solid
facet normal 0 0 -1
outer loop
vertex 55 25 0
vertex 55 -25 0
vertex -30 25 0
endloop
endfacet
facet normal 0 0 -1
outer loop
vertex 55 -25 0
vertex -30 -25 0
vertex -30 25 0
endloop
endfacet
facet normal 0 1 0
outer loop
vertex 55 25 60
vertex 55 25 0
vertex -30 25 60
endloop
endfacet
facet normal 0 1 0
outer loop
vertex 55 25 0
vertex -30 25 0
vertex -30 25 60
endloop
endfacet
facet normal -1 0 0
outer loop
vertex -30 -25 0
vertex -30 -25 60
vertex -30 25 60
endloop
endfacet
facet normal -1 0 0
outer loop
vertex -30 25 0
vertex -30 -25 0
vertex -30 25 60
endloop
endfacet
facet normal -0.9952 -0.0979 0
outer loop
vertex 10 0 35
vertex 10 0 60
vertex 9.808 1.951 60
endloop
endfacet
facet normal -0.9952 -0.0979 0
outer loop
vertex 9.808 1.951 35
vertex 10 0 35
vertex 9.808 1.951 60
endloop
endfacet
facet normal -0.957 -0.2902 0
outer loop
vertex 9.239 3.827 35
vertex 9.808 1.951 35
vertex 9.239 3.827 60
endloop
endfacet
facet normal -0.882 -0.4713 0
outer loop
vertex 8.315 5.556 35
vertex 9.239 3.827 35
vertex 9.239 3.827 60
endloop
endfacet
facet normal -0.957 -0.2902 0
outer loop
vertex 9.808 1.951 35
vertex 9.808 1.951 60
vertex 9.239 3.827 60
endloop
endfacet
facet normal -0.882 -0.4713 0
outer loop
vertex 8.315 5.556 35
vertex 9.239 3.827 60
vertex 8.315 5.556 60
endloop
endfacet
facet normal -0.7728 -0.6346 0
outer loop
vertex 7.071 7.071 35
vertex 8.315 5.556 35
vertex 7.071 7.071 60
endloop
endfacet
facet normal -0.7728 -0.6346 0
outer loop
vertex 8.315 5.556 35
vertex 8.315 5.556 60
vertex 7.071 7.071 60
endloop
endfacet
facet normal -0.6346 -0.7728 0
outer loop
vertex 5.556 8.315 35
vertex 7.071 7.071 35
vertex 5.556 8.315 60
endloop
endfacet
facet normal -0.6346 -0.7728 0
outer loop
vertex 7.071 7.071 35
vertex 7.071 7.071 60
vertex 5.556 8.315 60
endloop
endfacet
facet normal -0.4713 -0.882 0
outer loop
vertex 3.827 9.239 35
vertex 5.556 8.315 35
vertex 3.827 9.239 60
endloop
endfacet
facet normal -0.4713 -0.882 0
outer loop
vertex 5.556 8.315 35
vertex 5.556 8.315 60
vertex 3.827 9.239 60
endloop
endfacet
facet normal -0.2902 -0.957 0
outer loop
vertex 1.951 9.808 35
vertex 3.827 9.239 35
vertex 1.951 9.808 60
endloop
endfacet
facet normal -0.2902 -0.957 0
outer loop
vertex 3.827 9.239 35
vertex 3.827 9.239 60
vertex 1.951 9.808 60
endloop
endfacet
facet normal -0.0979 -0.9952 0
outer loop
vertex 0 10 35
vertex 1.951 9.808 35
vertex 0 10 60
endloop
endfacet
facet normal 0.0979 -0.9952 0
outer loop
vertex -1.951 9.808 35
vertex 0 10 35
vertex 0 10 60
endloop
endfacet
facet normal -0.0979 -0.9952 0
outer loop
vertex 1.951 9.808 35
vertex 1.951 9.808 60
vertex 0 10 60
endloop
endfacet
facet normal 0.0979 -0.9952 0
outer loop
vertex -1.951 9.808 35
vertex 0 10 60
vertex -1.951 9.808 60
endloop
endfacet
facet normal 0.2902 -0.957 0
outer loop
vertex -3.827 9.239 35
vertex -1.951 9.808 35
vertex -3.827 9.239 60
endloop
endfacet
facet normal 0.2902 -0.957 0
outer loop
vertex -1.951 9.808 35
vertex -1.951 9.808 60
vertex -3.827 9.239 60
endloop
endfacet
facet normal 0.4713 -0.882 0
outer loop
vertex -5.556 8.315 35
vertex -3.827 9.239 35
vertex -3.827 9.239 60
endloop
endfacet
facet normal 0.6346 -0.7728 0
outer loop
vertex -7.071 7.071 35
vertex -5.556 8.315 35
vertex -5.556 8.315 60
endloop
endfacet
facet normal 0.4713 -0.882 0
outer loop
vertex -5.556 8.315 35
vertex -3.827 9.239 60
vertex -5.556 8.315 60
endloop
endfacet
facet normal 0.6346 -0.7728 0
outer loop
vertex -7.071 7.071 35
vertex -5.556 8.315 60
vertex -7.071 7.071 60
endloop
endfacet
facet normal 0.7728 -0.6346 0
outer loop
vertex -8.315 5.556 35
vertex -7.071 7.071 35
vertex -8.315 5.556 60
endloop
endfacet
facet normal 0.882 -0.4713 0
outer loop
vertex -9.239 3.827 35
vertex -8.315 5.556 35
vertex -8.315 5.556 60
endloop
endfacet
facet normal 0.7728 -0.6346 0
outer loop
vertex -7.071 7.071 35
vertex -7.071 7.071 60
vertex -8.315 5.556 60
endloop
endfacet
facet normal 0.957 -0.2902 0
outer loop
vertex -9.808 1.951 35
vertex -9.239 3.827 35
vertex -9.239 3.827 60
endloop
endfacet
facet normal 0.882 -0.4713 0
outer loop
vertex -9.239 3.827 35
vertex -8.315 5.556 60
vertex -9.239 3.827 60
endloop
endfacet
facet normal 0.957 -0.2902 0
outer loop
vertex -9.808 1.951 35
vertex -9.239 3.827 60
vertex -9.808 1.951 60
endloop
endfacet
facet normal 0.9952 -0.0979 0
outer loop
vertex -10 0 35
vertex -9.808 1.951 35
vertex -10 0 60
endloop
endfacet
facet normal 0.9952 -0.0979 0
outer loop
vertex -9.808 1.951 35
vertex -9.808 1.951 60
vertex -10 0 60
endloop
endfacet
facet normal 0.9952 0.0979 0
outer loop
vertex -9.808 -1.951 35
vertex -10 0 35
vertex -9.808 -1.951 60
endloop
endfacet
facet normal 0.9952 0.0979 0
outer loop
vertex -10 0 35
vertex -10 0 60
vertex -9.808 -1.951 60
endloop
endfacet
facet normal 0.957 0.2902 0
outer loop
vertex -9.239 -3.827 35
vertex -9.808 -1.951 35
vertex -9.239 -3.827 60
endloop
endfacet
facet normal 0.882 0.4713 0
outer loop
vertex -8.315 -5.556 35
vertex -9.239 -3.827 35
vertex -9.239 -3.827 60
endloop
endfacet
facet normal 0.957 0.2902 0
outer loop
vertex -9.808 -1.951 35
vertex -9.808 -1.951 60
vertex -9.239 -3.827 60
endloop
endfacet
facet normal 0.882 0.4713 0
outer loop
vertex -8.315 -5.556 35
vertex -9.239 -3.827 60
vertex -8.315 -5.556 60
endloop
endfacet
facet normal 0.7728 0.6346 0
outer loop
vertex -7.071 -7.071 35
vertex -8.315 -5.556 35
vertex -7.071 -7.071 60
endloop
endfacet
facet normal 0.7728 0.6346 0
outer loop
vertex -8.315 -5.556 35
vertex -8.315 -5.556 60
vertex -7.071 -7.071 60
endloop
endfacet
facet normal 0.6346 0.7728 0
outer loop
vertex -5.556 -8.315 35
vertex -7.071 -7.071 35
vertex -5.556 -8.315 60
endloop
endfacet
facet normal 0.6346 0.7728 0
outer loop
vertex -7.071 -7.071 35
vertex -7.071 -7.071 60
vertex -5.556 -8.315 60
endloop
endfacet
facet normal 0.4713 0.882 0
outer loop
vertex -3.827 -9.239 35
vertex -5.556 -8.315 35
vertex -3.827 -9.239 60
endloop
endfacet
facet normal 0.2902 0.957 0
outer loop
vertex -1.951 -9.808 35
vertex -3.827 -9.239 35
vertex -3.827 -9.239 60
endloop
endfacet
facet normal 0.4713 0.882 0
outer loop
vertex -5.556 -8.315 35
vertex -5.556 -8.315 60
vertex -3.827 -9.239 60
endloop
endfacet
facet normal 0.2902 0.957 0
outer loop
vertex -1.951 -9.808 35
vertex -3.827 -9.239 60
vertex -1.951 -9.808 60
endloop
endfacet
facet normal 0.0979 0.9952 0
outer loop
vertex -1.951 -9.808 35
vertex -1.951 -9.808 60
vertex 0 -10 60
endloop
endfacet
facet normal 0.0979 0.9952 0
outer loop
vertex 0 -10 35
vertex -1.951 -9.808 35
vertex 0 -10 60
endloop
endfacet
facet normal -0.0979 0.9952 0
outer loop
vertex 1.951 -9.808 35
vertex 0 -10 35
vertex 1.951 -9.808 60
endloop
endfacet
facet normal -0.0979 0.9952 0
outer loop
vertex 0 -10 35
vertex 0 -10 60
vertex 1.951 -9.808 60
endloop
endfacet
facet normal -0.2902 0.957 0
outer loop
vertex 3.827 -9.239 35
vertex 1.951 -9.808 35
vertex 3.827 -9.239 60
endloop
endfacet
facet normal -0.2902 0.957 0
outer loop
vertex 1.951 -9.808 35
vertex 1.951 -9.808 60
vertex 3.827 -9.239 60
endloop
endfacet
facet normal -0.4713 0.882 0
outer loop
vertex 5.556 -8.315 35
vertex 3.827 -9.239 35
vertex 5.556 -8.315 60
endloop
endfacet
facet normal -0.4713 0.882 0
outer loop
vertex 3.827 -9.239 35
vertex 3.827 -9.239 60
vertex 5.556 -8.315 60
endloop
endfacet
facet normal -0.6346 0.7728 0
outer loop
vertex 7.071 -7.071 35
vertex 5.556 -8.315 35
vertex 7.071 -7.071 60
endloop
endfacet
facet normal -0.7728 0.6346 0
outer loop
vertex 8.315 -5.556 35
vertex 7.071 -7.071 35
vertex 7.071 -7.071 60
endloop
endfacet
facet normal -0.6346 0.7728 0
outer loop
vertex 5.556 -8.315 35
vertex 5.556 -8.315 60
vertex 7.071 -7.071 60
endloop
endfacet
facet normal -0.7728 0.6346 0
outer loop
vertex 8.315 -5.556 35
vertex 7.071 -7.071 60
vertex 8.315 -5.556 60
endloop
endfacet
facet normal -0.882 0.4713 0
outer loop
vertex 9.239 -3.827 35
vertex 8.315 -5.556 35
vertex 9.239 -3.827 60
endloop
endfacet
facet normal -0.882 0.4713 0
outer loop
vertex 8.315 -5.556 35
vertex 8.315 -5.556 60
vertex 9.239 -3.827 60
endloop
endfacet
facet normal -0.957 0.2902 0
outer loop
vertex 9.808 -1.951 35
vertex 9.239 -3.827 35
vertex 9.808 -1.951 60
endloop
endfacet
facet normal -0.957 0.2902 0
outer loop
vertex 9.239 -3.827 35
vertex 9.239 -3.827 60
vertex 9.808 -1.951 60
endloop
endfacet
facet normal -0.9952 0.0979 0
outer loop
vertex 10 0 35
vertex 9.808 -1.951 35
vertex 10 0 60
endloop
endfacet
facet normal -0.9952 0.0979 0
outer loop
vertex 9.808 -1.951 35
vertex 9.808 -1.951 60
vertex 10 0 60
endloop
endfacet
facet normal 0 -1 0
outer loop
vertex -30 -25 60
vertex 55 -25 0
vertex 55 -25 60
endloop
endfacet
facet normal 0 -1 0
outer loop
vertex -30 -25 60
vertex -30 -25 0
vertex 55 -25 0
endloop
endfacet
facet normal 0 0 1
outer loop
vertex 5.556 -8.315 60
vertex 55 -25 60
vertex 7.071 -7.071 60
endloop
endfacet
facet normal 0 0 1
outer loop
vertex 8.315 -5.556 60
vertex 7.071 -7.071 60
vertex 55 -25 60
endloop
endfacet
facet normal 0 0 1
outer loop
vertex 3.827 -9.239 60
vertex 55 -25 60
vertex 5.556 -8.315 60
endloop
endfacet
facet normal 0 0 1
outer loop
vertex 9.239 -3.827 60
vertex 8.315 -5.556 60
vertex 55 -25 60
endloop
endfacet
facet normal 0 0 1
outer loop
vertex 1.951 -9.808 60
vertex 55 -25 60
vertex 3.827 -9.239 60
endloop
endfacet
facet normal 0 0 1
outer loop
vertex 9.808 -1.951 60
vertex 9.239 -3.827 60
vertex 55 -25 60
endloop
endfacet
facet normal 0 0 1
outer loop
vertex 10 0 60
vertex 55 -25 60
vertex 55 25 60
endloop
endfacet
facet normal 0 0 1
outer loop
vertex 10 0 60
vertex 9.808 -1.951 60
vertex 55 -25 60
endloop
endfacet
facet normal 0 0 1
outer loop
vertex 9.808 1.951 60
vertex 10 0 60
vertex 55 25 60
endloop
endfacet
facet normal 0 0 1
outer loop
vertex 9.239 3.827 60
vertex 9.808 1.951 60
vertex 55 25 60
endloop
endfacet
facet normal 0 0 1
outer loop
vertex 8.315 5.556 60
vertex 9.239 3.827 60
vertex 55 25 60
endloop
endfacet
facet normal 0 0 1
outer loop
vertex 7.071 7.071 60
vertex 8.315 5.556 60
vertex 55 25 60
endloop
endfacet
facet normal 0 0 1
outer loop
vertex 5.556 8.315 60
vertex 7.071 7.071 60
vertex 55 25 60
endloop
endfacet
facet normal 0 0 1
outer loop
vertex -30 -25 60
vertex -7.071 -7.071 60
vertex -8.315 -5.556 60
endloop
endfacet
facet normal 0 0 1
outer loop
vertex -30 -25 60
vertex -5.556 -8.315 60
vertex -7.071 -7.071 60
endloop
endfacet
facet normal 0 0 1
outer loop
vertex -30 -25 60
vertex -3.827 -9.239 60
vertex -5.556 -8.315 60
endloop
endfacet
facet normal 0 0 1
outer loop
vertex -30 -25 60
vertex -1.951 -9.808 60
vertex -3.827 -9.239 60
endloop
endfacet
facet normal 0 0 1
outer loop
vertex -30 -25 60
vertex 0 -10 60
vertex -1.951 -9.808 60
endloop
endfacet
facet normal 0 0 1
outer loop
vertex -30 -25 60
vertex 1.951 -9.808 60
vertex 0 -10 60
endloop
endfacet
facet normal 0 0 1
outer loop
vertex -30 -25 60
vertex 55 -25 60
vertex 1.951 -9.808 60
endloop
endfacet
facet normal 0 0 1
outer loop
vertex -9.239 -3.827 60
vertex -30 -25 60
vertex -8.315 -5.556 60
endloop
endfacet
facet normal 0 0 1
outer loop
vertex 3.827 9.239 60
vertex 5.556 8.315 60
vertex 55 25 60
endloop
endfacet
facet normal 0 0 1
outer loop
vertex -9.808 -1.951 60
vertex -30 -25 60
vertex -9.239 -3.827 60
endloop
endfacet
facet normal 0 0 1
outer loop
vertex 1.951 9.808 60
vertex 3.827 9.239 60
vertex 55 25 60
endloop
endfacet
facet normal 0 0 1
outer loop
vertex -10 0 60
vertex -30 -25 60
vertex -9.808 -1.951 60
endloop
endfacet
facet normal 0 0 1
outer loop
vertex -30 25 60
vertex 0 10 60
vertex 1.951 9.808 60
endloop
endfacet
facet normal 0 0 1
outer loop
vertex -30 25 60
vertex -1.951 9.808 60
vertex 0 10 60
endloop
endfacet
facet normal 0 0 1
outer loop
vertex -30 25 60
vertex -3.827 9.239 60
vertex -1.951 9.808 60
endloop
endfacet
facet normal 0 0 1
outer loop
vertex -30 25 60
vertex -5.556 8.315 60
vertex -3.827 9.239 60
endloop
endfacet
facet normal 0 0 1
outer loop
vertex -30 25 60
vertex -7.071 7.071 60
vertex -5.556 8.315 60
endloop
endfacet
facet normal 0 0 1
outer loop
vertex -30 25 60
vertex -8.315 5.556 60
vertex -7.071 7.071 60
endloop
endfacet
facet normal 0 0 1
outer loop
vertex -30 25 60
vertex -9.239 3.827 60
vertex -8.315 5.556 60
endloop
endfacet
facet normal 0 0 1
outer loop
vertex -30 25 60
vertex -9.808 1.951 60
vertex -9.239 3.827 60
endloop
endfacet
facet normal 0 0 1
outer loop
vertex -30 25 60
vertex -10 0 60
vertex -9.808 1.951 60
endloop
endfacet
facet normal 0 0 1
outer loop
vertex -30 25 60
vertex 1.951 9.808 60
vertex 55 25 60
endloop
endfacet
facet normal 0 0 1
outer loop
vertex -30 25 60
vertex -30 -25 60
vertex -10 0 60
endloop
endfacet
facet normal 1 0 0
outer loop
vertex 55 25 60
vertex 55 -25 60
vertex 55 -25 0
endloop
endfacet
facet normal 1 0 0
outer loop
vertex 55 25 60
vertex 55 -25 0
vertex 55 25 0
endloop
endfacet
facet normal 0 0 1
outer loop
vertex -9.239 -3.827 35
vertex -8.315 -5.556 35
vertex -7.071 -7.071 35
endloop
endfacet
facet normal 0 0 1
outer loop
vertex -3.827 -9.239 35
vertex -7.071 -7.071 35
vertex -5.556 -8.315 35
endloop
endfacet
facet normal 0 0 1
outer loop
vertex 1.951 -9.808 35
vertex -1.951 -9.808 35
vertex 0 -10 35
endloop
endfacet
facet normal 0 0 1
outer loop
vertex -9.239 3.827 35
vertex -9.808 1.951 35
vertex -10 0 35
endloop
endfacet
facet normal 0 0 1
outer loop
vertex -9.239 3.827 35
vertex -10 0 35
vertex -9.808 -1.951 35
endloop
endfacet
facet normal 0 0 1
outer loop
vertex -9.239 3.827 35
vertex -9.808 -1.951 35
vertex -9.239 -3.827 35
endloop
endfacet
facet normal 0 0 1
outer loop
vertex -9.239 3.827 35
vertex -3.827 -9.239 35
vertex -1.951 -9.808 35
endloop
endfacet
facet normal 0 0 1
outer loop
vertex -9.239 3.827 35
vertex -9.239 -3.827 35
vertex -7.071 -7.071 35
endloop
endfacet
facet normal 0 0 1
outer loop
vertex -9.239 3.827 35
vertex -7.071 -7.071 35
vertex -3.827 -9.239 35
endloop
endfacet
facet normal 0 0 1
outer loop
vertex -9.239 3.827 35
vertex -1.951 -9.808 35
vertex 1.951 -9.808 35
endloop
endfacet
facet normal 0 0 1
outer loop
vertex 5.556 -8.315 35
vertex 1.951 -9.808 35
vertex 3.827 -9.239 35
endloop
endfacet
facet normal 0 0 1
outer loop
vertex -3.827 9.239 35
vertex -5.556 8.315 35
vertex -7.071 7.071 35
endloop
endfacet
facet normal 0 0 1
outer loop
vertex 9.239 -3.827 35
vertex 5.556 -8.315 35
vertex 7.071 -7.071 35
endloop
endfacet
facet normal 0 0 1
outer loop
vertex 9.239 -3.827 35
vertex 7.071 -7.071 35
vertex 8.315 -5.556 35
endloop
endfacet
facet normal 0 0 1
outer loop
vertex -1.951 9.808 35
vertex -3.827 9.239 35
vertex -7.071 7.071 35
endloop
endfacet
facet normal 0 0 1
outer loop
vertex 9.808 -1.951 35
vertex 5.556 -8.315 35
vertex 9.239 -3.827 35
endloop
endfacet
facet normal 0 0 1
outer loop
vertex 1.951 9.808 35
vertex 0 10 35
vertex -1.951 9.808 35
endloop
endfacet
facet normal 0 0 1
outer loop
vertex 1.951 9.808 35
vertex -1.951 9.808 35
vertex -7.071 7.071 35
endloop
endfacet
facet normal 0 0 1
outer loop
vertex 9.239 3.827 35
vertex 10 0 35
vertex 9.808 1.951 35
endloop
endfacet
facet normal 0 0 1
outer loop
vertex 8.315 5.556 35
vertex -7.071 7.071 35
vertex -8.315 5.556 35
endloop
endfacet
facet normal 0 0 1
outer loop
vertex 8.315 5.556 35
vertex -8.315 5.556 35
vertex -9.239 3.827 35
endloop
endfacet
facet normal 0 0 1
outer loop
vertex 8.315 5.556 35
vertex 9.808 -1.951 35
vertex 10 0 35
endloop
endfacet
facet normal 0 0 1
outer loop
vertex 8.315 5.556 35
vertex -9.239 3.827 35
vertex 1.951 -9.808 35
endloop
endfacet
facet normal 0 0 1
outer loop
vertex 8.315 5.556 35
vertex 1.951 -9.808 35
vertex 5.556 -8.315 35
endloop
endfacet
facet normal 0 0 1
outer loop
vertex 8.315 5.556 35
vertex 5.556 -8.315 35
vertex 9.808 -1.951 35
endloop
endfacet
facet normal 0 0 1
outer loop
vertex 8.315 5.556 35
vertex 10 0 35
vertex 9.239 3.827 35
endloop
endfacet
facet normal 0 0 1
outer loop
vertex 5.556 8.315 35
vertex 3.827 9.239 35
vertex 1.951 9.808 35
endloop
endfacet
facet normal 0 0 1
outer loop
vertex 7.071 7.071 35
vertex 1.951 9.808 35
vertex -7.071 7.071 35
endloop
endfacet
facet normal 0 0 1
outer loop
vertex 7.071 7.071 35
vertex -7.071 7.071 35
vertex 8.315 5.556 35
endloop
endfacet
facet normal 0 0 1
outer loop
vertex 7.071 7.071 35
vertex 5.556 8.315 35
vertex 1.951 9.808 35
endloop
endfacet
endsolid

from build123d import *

# Parameters (mm, degrees)
F0_W     = 60
F0_H     = 50
F1_DEPTH = 60
F2_R     = 10
F3_DEPTH = 25
F4_DEPTH = 25


with BuildPart() as f1:
    # F0 (on Top) → F1 (new body)
    with BuildSketch(Plane.XY):
        Rectangle(F0_W, F0_H)
    extrude(amount=F1_DEPTH)

    # F2 (on face) → F3 (cut)
    with BuildSketch(Plane.XY.offset(60)):
        Circle(F2_R)
    extrude(amount=-F3_DEPTH, mode=Mode.SUBTRACT)

    # F4 (add): a face of the model
    f4_faces = [f1.faces().sort_by_distance(p)[0] for p in [
        (30, 0, 30),
    ]]
    extrude(f4_faces, amount=F4_DEPTH)


solid = f1.part
